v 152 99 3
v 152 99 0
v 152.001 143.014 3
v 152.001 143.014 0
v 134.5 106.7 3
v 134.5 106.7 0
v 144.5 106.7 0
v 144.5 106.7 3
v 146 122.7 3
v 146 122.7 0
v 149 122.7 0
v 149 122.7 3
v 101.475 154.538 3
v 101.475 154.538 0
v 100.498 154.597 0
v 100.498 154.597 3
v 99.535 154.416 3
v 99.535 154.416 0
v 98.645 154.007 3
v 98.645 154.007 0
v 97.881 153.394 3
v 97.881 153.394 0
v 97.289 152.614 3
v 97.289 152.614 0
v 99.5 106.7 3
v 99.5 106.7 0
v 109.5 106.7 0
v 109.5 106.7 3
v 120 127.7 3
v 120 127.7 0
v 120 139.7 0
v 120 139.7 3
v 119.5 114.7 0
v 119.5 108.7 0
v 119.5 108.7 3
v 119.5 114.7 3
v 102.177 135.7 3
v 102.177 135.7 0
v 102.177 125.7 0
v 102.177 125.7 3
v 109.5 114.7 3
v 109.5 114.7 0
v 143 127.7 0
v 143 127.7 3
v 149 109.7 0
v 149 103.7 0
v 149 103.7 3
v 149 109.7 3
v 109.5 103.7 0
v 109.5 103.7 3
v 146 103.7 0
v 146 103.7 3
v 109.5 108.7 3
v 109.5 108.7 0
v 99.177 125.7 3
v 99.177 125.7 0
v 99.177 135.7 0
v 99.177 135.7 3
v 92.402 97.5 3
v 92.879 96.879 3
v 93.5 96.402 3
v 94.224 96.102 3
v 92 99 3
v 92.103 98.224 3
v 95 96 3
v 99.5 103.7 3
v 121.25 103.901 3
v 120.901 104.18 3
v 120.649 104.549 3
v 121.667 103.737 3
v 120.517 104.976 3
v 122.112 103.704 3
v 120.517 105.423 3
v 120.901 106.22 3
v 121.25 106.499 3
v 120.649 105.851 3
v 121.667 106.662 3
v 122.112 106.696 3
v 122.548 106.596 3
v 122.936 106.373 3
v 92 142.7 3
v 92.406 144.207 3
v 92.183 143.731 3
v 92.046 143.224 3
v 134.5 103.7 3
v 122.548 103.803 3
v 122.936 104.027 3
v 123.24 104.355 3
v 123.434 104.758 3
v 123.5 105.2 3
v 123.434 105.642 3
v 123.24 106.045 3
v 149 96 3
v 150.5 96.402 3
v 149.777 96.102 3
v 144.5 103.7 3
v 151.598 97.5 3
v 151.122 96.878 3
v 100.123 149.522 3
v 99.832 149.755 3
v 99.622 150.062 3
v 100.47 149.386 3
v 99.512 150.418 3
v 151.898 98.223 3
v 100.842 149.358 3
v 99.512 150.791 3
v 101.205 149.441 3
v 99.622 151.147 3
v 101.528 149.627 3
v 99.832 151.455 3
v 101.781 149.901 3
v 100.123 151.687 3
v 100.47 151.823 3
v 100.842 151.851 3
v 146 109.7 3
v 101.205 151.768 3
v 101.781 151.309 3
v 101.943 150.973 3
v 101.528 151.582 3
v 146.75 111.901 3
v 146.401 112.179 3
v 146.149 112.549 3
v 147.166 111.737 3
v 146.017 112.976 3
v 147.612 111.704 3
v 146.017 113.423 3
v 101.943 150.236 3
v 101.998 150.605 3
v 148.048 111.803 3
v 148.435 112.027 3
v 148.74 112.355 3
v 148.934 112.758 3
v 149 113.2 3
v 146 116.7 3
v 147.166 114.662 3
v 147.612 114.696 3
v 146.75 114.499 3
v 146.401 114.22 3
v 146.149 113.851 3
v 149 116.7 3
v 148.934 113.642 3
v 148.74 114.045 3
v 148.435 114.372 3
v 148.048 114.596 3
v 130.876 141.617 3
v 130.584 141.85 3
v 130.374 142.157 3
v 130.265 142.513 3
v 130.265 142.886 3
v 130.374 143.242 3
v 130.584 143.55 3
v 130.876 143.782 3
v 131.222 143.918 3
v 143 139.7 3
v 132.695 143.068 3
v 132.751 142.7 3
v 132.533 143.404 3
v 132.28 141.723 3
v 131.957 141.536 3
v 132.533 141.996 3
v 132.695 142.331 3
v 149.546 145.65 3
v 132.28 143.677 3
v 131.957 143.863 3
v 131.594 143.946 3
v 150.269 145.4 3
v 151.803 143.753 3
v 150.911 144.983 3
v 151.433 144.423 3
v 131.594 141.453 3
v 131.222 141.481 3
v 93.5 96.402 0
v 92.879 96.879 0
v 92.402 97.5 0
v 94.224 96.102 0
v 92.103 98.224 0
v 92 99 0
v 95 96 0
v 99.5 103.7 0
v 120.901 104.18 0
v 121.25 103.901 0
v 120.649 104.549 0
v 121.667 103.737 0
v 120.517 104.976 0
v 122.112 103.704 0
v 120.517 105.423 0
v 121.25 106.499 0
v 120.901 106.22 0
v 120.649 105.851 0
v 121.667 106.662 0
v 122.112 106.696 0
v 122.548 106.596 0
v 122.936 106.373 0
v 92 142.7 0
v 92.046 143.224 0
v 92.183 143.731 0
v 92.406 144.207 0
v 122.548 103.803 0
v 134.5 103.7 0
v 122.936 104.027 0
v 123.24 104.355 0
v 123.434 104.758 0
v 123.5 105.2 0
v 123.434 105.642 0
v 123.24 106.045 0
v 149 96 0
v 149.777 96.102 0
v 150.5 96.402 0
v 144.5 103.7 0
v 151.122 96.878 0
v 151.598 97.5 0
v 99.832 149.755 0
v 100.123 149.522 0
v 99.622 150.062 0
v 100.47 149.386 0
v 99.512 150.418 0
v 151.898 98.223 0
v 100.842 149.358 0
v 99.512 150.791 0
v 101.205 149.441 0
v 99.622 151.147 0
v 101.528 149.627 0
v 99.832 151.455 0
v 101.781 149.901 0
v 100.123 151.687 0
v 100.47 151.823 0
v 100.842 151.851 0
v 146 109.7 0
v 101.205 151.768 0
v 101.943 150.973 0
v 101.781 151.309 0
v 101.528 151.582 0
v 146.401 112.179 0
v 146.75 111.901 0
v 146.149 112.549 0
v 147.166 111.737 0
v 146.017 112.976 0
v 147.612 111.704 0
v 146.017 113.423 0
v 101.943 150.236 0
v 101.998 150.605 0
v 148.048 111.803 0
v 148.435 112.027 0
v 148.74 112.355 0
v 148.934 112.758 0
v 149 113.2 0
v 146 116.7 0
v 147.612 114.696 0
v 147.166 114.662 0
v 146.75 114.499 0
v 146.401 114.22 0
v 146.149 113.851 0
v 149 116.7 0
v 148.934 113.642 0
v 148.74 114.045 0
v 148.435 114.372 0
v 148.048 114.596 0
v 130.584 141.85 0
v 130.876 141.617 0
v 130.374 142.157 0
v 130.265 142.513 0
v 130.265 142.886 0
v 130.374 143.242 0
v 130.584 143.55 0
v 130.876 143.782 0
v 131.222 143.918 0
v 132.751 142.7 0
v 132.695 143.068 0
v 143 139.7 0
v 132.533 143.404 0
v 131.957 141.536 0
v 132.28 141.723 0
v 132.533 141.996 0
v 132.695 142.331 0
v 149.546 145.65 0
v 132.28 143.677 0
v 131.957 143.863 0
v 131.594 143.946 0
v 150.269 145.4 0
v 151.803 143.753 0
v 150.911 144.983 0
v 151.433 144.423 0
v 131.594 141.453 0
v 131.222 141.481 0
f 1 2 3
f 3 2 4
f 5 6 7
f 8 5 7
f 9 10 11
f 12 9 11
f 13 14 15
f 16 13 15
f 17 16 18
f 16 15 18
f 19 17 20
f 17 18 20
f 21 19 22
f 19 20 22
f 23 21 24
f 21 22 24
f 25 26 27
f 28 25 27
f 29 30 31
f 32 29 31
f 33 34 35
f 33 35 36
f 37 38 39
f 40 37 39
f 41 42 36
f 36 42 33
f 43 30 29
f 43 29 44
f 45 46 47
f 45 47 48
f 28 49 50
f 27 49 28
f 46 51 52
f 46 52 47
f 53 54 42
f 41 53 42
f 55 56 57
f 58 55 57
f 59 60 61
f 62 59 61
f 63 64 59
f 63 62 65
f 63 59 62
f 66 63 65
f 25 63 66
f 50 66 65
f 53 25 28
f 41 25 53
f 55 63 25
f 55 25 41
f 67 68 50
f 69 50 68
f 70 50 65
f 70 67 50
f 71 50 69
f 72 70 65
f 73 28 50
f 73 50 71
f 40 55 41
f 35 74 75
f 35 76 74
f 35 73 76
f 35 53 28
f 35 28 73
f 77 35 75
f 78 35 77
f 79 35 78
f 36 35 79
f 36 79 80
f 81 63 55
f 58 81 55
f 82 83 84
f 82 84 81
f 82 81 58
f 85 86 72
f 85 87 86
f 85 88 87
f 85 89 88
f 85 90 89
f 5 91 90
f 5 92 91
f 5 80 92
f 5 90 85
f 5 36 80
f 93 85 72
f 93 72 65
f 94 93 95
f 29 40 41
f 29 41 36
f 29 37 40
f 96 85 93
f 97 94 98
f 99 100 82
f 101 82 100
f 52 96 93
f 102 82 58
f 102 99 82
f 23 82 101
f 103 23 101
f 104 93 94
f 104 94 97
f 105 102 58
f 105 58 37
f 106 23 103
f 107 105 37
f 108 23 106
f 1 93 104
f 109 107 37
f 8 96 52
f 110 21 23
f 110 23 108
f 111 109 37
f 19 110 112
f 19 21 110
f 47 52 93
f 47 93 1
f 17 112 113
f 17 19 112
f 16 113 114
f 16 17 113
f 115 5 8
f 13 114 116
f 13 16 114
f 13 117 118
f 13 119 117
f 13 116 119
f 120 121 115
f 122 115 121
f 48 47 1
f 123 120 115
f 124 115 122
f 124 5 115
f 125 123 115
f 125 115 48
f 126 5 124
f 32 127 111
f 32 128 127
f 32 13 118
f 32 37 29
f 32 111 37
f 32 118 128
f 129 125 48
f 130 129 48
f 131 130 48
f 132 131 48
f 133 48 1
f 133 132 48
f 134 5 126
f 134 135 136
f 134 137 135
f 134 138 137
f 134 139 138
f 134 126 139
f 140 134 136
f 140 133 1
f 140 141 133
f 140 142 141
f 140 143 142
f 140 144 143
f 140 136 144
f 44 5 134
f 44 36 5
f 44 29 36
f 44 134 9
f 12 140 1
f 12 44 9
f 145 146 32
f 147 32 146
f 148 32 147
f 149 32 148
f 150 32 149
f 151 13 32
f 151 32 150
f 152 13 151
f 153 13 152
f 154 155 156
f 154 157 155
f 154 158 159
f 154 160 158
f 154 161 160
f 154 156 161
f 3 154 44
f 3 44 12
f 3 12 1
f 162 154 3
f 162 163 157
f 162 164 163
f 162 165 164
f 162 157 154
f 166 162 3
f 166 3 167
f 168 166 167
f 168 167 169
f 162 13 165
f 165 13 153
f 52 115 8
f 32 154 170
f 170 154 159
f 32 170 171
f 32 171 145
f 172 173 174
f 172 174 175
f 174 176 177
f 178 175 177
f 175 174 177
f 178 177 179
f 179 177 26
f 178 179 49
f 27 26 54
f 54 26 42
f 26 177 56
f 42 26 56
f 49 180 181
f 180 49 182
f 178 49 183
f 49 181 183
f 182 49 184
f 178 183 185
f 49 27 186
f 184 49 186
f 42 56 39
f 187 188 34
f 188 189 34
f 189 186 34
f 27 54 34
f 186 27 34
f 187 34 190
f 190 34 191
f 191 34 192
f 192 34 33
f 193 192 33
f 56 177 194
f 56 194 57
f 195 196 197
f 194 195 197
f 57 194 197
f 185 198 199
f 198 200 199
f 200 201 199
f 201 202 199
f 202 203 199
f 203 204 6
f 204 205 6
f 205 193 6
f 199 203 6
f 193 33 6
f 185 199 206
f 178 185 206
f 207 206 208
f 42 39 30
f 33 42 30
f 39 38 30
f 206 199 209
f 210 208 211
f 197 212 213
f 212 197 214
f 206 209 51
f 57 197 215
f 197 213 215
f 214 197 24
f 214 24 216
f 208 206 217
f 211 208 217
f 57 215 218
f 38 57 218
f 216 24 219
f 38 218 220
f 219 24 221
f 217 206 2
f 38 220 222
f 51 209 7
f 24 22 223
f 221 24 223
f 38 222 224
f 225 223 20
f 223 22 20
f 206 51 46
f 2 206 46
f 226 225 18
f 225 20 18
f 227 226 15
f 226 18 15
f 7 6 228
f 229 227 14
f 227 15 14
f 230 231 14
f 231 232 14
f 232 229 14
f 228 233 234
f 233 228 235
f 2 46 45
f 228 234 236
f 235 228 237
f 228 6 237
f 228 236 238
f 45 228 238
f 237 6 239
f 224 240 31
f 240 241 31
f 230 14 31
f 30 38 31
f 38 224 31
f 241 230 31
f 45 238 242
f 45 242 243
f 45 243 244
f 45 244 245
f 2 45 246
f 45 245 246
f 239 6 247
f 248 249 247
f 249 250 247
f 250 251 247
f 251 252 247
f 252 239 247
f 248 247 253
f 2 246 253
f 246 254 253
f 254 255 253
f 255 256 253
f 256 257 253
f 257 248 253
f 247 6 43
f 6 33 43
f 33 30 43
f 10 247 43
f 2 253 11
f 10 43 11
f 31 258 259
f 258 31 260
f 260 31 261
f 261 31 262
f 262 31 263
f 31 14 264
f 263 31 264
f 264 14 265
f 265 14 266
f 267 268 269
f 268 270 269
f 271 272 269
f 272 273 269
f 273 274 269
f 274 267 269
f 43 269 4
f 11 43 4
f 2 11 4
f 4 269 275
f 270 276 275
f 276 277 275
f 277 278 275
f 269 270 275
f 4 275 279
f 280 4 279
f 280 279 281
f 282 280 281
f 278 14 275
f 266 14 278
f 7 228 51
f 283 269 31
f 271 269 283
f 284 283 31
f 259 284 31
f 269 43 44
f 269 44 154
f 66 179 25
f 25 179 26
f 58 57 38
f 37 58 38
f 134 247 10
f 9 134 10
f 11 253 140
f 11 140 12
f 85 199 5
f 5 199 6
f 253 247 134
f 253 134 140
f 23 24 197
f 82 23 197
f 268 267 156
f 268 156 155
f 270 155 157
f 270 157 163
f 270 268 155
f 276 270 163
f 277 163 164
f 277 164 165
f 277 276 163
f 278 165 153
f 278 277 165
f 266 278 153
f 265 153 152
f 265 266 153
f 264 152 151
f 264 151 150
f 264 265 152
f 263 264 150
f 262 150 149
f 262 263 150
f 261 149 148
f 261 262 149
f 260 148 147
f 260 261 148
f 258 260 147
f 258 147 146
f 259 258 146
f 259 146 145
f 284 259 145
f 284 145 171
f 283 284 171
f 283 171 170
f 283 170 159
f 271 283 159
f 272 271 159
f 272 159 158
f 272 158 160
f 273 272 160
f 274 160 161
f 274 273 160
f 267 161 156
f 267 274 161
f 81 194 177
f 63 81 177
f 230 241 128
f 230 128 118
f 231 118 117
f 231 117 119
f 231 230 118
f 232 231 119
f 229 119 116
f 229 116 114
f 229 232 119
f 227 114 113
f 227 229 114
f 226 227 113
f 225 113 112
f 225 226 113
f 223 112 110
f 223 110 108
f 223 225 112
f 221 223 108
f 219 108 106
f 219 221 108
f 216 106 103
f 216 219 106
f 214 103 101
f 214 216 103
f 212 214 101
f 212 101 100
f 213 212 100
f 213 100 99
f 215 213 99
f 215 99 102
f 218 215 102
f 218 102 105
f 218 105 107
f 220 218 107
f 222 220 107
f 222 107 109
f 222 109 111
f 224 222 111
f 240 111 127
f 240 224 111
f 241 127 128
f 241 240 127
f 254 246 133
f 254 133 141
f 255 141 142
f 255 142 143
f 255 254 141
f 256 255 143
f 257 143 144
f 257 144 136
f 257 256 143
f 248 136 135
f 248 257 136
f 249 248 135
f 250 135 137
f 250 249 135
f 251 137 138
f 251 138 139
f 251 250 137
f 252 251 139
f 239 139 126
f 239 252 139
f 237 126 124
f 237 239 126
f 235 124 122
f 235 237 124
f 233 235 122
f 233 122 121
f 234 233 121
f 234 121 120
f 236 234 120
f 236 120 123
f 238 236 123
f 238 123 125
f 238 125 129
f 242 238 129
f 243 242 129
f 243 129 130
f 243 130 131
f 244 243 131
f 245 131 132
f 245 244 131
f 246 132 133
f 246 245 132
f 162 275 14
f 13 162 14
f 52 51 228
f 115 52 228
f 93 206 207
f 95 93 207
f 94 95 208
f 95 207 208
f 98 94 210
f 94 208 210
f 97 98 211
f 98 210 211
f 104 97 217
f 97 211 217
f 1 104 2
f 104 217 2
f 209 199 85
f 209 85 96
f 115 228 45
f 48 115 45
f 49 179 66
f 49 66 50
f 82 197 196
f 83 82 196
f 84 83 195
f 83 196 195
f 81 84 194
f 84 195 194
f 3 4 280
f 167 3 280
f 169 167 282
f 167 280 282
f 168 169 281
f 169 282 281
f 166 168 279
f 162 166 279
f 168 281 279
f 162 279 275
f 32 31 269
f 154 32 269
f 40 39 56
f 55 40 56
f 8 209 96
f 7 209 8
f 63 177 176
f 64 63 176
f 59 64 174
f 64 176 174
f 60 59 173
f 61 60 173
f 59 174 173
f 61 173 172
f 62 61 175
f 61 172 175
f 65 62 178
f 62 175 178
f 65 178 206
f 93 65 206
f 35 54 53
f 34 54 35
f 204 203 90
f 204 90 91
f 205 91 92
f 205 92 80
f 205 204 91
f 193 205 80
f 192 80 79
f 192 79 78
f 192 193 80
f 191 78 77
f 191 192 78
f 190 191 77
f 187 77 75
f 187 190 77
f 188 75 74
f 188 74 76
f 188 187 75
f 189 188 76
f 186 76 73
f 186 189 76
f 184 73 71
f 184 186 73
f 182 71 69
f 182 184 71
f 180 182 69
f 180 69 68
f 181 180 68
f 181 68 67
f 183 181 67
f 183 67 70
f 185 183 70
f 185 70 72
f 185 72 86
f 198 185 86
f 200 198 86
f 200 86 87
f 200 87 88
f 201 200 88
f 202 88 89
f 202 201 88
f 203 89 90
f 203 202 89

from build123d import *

# Parameters (mm, degrees)
SKETCH_1_R      = 1.25
SKETCH_1_R_2    = 1.500000002
SKETCH_1_W      = 22.999938461
SKETCH_1_H      = 12.000117949
SKETCH_1_W_2    = 2.999969231
SKETCH_1_H_2    = 6.000015385
SKETCH_1_W_3    = 9.999984615
SKETCH_1_H_3    = 3.000051282
SKETCH_1_W_4    = 10
SKETCH_1_H_4    = 6
SKETCH_1_W_5    = 9.999984616
EXTRUDE_1_DEPTH = 3


with BuildPart() as part:
    # 草圖1 → 填料-伸長1 (new body)
    with BuildSketch(Plane.XY):
        with BuildLine():
            Line((149.545923845, 145.649704894), (101.475469426, 154.53805141))
            ThreePointArc((101.475469426, 154.53805141), (99.077497598, 154.23914087), (97.289259558, 152.613772878))
            Line((97.289259558, 152.613772878), (92.406316445, 144.206797918))
            ThreePointArc((92.406316445, 144.206797918), (92.103687803, 143.480249781), (92.000408718, 142.7))
            Line((92.000408718, 142.7), (92.0003, 99))
            ThreePointArc((92.0003, 99), (92.878928766, 96.87870585), (95.000184615, 95.999984616))
            Line((95.000184615, 95.999984616), (149.000184614, 95.999707693))
            ThreePointArc((149.000184614, 95.999707693), (151.121568411, 96.878376105), (152.000399999, 98.999692307))
            Line((152.000399999, 98.999692307), (152.001144765, 143.013690924))
            ThreePointArc((152.001144765, 143.013690924), (151.188953144, 144.718624927), (149.545923845, 145.649704894))
        make_face()
        with Locations((131.500611289, 142.699797442)):
            Circle(SKETCH_1_R, mode=Mode.SUBTRACT)
        with Locations((147.500257437, 113.199715383)):
            Circle(SKETCH_1_R_2, mode=Mode.SUBTRACT)
        with Locations((122.000316411, 105.199794873)):
            Circle(SKETCH_1_R_2, mode=Mode.SUBTRACT)
        with Locations((100.748149255, 150.60475514)):
            Circle(SKETCH_1_R, mode=Mode.SUBTRACT)
        Polygon((102.176568231, 125.699947814), (99.176568231, 125.699963199), (99.176619513, 135.699963199), (102.176619513, 135.699947814), align=None, mode=Mode.SUBTRACT)
        with Locations((131.500362564, 133.699797435)):
            Rectangle(SKETCH_1_W, SKETCH_1_H, mode=Mode.SUBTRACT)
        with Locations((147.500290769, 119.699715384)):
            Rectangle(SKETCH_1_W_2, SKETCH_1_H_2, mode=Mode.SUBTRACT)
        with Locations((139.50021641, 105.19975641)):
            Rectangle(SKETCH_1_W_3, SKETCH_1_H_3, mode=Mode.SUBTRACT)
        with Locations((147.500224102, 106.699715384)):
            Rectangle(SKETCH_1_W_2, SKETCH_1_H_2, mode=Mode.SUBTRACT)
        with Locations((114.500224102, 111.699910257)):
            Rectangle(SKETCH_1_W_4, SKETCH_1_H_4, mode=Mode.SUBTRACT)
        with Locations((104.50021641, 105.199935898)):
            Rectangle(SKETCH_1_W_5, SKETCH_1_H_3, mode=Mode.SUBTRACT)
    extrude(amount=EXTRUDE_1_DEPTH)


solid = part.part
